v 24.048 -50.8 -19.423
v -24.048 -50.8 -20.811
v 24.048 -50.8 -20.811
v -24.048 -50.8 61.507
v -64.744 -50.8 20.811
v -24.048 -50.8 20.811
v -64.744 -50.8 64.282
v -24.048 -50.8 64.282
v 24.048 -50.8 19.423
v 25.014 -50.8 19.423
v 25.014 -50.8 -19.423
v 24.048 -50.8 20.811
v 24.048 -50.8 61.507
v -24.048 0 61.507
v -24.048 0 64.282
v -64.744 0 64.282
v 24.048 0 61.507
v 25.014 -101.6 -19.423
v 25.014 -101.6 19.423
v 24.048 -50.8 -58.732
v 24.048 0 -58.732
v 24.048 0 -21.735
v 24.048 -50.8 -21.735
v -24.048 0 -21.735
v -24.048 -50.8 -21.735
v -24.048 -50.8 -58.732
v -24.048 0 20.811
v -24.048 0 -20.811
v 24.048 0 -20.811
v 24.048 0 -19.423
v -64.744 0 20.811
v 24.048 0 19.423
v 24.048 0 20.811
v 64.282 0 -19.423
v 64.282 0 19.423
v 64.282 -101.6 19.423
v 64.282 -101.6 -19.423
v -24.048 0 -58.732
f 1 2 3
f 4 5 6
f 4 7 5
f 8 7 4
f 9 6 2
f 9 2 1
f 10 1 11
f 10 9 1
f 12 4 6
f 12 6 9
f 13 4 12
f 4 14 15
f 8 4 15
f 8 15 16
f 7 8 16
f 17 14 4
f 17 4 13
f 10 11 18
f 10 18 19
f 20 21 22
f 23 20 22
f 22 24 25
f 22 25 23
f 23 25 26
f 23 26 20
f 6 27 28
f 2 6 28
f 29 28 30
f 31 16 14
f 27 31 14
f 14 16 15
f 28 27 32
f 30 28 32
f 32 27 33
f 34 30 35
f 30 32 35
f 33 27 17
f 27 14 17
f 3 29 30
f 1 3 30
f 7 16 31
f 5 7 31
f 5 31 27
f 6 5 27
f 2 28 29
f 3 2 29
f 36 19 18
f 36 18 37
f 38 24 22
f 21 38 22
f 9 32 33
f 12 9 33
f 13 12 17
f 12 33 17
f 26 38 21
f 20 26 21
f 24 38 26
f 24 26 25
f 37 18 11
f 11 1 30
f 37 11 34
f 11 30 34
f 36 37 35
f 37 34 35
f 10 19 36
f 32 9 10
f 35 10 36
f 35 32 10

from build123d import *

# Parameters (mm, degrees)
F0_W     = 48.0955578387
F0_H     = 40.696233511
F0_W_2   = 40.2337741107
F0_H_2   = 38.8464033604
F0_W_3   = 0.4624519497
F1_DEPTH = 50.8
F0_H_3   = 36.9965806603
F2_W     = 39.2677858472
F2_H     = 38.8464033604
F3_DEPTH = 50.8


with BuildPart() as f1:
    # F0 (on Front) → F1 (new body)
    with BuildSketch(Plane.XZ):
        with Locations((0, 41.1586947739)):
            Rectangle(F0_W, F0_H)
        Polygon((24.0477789193, 20.8105780184), (-24.0477789193, 20.8105780184), (-24.0477789193, -20.8105780184), (24.0477789193, -20.8105780184), (24.0477789193, -19.4232016802), (23.5853269696, -19.4232016802), (23.5853269696, 19.4232016802), (24.0477789193, 19.4232016802), align=None)
        Polygon((-64.7440161556, 20.8105780184), (-24.0477789193, 20.8105780184), (-24.0477789193, 61.5068115294), (-24.0477789193, 64.2815642059), (-64.7440161556, 64.2815642059), align=None)
        with Locations((44.1646659747, 0)):
            Rectangle(F0_W_2, F0_H_2)
        with Locations((23.8165529445, 0)):
            Rectangle(F0_W_3, F0_H_2)
    extrude(amount=F1_DEPTH)

    # F2 (on face) → F3 (join)
    with BuildSketch(Plane.XZ.offset(50.8)):
        with Locations((44.6476601064, 0)):
            Rectangle(F2_W, F2_H)
    extrude(amount=F3_DEPTH)


with BuildPart() as f1b:
    # F0 (on Front) → F1, piece 2 (new body)
    with BuildSketch(Plane.XZ):
        with Locations((0, -40.2337759733)):
            Rectangle(F0_W, F0_H_3)
    extrude(amount=F1_DEPTH)


solid = Compound([f1.part, f1b.part])
